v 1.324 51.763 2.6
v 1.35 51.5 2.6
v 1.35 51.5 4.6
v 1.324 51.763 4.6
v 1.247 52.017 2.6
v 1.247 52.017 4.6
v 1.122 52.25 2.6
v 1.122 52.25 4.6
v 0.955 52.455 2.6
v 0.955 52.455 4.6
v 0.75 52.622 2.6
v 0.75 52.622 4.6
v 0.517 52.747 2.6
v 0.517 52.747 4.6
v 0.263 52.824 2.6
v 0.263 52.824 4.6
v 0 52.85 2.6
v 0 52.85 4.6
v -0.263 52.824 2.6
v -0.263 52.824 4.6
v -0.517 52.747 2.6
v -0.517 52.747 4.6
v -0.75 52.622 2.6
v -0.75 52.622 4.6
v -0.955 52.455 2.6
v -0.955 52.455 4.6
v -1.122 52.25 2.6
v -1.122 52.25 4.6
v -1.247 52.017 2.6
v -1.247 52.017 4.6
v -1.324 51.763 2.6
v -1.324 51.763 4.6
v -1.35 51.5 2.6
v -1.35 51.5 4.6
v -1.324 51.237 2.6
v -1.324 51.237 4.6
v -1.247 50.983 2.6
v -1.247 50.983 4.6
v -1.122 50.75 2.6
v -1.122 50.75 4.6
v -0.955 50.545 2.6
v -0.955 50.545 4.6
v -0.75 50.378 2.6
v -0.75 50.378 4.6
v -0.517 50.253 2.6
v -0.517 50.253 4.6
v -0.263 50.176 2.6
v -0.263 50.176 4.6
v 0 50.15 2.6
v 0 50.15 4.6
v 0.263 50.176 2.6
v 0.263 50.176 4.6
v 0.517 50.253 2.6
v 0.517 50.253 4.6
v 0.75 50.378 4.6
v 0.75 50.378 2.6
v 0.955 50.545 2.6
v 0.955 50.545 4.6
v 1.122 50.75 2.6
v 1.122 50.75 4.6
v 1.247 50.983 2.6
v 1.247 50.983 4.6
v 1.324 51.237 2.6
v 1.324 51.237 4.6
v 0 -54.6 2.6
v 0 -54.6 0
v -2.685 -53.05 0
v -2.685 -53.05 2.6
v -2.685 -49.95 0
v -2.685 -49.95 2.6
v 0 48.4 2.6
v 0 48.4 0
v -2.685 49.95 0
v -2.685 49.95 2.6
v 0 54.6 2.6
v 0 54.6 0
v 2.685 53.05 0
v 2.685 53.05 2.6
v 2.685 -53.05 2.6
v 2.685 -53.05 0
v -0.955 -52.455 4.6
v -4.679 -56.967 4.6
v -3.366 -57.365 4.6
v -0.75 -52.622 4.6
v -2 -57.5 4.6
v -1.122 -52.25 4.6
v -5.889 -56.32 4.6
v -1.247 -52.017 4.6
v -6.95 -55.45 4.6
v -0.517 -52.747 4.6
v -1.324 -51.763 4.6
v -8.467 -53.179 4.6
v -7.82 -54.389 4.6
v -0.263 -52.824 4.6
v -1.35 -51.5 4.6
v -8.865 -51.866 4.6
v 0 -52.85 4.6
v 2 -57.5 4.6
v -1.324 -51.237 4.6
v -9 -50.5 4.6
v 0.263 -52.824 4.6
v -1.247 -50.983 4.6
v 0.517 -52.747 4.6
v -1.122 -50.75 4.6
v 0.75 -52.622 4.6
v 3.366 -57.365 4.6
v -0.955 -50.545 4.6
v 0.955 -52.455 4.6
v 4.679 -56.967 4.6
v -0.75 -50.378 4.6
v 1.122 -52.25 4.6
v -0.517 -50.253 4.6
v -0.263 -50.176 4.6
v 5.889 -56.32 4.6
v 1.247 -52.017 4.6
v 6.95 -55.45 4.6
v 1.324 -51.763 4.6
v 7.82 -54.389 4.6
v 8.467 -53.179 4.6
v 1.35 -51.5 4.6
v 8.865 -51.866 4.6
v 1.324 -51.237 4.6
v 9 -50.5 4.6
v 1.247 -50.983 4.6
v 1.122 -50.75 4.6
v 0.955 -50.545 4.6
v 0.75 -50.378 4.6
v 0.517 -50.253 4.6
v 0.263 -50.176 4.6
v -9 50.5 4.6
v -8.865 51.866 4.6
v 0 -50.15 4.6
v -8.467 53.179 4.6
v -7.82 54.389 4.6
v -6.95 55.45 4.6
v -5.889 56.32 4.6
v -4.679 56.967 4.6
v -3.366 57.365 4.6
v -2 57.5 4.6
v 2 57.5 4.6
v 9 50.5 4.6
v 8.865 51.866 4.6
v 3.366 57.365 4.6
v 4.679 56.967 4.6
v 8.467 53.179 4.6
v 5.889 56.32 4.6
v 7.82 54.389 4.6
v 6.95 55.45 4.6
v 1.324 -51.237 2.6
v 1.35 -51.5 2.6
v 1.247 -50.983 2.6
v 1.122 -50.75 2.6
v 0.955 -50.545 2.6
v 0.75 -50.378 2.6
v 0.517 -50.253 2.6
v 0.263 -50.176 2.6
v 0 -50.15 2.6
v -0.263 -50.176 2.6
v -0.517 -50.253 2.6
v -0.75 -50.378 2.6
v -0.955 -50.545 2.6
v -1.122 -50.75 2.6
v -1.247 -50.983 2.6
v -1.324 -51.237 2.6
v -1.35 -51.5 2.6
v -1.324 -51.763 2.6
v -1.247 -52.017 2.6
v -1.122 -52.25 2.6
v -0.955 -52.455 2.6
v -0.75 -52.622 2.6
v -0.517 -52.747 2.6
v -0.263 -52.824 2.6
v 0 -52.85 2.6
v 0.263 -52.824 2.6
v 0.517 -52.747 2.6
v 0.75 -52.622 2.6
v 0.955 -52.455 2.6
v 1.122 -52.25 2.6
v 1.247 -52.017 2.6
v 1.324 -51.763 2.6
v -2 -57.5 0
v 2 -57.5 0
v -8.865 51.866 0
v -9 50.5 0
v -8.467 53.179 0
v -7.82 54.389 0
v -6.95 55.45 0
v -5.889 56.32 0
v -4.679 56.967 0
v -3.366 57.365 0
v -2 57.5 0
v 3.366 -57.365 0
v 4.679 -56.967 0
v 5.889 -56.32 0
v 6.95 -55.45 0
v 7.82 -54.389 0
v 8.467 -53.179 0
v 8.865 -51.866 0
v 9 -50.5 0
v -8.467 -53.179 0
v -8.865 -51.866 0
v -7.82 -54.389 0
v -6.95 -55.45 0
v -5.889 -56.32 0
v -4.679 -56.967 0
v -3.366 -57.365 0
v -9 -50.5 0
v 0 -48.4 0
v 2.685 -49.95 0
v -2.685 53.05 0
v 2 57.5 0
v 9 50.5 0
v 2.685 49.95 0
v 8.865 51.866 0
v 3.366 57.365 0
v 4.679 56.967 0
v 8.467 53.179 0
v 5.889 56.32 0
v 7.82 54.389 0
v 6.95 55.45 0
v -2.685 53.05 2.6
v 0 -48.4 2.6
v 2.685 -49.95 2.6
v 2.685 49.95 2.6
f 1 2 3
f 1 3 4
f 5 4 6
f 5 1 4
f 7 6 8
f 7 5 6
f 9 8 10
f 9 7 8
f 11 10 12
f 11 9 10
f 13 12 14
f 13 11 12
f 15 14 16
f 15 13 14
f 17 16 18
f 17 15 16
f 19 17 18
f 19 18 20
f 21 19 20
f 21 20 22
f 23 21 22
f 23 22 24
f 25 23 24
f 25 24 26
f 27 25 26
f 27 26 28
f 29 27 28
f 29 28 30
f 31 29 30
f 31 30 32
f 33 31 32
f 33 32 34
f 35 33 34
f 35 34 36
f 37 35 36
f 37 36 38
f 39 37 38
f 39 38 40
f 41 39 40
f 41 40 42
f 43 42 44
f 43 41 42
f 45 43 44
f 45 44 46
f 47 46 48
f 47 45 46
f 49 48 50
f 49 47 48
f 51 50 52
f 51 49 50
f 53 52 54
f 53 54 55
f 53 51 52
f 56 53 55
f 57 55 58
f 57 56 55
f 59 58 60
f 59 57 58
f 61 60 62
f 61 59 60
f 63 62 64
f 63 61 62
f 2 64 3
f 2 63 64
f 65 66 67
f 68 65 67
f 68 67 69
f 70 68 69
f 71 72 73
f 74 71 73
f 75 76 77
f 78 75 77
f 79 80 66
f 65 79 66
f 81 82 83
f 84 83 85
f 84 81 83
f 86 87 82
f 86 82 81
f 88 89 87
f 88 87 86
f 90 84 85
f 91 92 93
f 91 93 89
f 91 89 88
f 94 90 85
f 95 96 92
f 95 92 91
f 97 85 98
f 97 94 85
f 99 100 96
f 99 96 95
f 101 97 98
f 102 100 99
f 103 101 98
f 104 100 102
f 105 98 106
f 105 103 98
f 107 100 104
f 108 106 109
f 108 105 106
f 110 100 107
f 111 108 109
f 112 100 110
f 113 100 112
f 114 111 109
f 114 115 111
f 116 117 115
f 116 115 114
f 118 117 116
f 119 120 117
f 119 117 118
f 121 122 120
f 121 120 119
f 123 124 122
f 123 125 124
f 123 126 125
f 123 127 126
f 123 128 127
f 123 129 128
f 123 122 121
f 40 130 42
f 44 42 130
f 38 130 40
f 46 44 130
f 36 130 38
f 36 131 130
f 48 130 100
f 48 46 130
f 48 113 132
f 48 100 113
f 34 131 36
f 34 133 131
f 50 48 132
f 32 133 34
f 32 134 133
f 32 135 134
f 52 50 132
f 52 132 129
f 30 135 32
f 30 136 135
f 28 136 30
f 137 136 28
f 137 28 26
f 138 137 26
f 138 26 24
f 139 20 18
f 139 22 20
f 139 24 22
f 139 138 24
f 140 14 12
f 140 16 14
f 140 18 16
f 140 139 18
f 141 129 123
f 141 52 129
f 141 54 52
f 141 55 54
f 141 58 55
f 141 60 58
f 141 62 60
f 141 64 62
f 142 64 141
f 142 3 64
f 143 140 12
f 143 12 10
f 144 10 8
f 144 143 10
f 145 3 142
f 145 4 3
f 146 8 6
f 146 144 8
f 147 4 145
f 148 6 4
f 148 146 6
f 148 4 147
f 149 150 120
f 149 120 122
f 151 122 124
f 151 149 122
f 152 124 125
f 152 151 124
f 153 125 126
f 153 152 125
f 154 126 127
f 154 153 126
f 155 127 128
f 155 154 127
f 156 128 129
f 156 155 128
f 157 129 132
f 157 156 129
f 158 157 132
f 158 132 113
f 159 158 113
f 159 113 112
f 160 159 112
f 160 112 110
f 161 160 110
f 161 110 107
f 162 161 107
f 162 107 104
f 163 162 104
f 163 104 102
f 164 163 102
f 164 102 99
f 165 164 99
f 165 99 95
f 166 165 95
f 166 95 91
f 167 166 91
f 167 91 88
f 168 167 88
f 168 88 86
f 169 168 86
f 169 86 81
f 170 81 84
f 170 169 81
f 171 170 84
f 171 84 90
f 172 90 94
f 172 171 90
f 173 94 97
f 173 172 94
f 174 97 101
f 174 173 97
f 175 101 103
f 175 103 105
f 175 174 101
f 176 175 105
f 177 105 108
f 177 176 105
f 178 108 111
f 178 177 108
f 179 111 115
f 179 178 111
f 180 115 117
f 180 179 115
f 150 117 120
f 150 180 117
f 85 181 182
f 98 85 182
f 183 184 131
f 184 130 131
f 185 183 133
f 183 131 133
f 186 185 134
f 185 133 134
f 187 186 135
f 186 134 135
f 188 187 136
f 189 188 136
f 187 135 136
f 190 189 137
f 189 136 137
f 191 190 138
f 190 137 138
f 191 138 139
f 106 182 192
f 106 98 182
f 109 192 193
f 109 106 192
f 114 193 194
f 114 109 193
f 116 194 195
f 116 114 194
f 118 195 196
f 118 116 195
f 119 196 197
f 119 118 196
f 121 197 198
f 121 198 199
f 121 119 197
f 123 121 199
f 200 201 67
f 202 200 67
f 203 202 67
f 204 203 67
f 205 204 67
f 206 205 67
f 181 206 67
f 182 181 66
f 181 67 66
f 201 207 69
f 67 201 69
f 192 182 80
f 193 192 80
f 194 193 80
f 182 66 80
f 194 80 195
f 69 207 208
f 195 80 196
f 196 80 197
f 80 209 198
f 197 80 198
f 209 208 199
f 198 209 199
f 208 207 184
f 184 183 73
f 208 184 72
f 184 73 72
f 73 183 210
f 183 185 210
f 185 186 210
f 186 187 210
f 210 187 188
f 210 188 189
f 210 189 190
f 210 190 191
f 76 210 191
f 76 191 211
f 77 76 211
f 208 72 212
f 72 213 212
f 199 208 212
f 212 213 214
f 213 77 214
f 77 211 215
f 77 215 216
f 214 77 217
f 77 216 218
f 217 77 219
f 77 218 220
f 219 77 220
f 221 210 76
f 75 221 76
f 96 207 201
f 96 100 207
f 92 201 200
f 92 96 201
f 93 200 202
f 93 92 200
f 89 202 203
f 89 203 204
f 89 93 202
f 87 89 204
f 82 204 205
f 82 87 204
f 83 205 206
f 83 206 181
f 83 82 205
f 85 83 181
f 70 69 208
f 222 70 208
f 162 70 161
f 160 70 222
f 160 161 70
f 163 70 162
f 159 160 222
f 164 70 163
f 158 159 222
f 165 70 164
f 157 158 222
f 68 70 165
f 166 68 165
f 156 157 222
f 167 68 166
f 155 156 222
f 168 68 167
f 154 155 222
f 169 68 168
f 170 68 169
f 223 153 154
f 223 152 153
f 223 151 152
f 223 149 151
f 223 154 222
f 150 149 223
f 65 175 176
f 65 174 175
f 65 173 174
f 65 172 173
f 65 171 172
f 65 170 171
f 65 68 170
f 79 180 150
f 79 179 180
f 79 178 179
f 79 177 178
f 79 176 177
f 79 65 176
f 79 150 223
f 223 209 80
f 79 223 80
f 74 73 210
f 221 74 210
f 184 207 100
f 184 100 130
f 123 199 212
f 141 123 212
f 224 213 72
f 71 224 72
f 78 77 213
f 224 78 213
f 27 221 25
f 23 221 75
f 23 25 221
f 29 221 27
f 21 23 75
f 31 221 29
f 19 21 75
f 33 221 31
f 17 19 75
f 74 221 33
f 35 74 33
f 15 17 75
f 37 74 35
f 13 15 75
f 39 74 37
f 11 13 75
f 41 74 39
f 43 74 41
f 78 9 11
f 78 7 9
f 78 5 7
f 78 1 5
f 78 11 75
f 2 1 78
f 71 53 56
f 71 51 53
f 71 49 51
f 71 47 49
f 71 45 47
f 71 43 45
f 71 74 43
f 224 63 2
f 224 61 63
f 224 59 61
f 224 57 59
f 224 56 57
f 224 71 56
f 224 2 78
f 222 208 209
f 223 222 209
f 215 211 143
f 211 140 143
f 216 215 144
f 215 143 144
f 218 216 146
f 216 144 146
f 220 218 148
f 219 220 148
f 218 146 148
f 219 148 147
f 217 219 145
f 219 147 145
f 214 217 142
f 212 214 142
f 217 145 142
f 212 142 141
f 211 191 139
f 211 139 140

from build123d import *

# Parameters (mm, degrees)
SKETCH002_W     = 18
SKETCH002_H     = 115
SKETCH002_R     = 1.35
PAD001_DEPTH    = 4.6
POCKET001_DEPTH = 2.6
FILLET001_R     = 7


with BuildPart() as part:
    # Sketch002 → Pad001 (new body)
    with BuildSketch(Plane.XY):
        Rectangle(SKETCH002_W, SKETCH002_H)
        with Locations((0, 51.5)):
            Circle(SKETCH002_R, mode=Mode.SUBTRACT)
        with Locations((0, -51.5)):
            Circle(SKETCH002_R, mode=Mode.SUBTRACT)
    extrude(amount=PAD001_DEPTH)

    # Sketch003 (on Face7 of Pad001) → Pocket001 (cut)
    with BuildSketch(Plane(origin=(0, 0, 0), x_dir=(1, 0, 0), z_dir=(0, 0, -1))):
        Polygon((2.684679, 49.95), (2.684679, 53.05), (0, 54.6), (-2.684679, 53.05), (-2.684679, 49.95), (0, 48.4), align=None)
        Polygon((2.684679, -53.05), (2.684679, -49.95), (0, -48.4), (-2.684679, -49.95), (-2.684679, -53.05), (0, -54.6), align=None)
    extrude(amount=-POCKET001_DEPTH, mode=Mode.SUBTRACT)

    # Fillet001
    fillet001_edges = [part.edges().sort_by_distance(p)[0] for p in [
        (-9, 57.5, 2.3),
        (9, 57.5, 2.3),
        (9, -57.5, 2.3),
        (-9, -57.5, 2.3),
    ]]
    fillet(fillet001_edges, radius=FILLET001_R)


solid = part.part
